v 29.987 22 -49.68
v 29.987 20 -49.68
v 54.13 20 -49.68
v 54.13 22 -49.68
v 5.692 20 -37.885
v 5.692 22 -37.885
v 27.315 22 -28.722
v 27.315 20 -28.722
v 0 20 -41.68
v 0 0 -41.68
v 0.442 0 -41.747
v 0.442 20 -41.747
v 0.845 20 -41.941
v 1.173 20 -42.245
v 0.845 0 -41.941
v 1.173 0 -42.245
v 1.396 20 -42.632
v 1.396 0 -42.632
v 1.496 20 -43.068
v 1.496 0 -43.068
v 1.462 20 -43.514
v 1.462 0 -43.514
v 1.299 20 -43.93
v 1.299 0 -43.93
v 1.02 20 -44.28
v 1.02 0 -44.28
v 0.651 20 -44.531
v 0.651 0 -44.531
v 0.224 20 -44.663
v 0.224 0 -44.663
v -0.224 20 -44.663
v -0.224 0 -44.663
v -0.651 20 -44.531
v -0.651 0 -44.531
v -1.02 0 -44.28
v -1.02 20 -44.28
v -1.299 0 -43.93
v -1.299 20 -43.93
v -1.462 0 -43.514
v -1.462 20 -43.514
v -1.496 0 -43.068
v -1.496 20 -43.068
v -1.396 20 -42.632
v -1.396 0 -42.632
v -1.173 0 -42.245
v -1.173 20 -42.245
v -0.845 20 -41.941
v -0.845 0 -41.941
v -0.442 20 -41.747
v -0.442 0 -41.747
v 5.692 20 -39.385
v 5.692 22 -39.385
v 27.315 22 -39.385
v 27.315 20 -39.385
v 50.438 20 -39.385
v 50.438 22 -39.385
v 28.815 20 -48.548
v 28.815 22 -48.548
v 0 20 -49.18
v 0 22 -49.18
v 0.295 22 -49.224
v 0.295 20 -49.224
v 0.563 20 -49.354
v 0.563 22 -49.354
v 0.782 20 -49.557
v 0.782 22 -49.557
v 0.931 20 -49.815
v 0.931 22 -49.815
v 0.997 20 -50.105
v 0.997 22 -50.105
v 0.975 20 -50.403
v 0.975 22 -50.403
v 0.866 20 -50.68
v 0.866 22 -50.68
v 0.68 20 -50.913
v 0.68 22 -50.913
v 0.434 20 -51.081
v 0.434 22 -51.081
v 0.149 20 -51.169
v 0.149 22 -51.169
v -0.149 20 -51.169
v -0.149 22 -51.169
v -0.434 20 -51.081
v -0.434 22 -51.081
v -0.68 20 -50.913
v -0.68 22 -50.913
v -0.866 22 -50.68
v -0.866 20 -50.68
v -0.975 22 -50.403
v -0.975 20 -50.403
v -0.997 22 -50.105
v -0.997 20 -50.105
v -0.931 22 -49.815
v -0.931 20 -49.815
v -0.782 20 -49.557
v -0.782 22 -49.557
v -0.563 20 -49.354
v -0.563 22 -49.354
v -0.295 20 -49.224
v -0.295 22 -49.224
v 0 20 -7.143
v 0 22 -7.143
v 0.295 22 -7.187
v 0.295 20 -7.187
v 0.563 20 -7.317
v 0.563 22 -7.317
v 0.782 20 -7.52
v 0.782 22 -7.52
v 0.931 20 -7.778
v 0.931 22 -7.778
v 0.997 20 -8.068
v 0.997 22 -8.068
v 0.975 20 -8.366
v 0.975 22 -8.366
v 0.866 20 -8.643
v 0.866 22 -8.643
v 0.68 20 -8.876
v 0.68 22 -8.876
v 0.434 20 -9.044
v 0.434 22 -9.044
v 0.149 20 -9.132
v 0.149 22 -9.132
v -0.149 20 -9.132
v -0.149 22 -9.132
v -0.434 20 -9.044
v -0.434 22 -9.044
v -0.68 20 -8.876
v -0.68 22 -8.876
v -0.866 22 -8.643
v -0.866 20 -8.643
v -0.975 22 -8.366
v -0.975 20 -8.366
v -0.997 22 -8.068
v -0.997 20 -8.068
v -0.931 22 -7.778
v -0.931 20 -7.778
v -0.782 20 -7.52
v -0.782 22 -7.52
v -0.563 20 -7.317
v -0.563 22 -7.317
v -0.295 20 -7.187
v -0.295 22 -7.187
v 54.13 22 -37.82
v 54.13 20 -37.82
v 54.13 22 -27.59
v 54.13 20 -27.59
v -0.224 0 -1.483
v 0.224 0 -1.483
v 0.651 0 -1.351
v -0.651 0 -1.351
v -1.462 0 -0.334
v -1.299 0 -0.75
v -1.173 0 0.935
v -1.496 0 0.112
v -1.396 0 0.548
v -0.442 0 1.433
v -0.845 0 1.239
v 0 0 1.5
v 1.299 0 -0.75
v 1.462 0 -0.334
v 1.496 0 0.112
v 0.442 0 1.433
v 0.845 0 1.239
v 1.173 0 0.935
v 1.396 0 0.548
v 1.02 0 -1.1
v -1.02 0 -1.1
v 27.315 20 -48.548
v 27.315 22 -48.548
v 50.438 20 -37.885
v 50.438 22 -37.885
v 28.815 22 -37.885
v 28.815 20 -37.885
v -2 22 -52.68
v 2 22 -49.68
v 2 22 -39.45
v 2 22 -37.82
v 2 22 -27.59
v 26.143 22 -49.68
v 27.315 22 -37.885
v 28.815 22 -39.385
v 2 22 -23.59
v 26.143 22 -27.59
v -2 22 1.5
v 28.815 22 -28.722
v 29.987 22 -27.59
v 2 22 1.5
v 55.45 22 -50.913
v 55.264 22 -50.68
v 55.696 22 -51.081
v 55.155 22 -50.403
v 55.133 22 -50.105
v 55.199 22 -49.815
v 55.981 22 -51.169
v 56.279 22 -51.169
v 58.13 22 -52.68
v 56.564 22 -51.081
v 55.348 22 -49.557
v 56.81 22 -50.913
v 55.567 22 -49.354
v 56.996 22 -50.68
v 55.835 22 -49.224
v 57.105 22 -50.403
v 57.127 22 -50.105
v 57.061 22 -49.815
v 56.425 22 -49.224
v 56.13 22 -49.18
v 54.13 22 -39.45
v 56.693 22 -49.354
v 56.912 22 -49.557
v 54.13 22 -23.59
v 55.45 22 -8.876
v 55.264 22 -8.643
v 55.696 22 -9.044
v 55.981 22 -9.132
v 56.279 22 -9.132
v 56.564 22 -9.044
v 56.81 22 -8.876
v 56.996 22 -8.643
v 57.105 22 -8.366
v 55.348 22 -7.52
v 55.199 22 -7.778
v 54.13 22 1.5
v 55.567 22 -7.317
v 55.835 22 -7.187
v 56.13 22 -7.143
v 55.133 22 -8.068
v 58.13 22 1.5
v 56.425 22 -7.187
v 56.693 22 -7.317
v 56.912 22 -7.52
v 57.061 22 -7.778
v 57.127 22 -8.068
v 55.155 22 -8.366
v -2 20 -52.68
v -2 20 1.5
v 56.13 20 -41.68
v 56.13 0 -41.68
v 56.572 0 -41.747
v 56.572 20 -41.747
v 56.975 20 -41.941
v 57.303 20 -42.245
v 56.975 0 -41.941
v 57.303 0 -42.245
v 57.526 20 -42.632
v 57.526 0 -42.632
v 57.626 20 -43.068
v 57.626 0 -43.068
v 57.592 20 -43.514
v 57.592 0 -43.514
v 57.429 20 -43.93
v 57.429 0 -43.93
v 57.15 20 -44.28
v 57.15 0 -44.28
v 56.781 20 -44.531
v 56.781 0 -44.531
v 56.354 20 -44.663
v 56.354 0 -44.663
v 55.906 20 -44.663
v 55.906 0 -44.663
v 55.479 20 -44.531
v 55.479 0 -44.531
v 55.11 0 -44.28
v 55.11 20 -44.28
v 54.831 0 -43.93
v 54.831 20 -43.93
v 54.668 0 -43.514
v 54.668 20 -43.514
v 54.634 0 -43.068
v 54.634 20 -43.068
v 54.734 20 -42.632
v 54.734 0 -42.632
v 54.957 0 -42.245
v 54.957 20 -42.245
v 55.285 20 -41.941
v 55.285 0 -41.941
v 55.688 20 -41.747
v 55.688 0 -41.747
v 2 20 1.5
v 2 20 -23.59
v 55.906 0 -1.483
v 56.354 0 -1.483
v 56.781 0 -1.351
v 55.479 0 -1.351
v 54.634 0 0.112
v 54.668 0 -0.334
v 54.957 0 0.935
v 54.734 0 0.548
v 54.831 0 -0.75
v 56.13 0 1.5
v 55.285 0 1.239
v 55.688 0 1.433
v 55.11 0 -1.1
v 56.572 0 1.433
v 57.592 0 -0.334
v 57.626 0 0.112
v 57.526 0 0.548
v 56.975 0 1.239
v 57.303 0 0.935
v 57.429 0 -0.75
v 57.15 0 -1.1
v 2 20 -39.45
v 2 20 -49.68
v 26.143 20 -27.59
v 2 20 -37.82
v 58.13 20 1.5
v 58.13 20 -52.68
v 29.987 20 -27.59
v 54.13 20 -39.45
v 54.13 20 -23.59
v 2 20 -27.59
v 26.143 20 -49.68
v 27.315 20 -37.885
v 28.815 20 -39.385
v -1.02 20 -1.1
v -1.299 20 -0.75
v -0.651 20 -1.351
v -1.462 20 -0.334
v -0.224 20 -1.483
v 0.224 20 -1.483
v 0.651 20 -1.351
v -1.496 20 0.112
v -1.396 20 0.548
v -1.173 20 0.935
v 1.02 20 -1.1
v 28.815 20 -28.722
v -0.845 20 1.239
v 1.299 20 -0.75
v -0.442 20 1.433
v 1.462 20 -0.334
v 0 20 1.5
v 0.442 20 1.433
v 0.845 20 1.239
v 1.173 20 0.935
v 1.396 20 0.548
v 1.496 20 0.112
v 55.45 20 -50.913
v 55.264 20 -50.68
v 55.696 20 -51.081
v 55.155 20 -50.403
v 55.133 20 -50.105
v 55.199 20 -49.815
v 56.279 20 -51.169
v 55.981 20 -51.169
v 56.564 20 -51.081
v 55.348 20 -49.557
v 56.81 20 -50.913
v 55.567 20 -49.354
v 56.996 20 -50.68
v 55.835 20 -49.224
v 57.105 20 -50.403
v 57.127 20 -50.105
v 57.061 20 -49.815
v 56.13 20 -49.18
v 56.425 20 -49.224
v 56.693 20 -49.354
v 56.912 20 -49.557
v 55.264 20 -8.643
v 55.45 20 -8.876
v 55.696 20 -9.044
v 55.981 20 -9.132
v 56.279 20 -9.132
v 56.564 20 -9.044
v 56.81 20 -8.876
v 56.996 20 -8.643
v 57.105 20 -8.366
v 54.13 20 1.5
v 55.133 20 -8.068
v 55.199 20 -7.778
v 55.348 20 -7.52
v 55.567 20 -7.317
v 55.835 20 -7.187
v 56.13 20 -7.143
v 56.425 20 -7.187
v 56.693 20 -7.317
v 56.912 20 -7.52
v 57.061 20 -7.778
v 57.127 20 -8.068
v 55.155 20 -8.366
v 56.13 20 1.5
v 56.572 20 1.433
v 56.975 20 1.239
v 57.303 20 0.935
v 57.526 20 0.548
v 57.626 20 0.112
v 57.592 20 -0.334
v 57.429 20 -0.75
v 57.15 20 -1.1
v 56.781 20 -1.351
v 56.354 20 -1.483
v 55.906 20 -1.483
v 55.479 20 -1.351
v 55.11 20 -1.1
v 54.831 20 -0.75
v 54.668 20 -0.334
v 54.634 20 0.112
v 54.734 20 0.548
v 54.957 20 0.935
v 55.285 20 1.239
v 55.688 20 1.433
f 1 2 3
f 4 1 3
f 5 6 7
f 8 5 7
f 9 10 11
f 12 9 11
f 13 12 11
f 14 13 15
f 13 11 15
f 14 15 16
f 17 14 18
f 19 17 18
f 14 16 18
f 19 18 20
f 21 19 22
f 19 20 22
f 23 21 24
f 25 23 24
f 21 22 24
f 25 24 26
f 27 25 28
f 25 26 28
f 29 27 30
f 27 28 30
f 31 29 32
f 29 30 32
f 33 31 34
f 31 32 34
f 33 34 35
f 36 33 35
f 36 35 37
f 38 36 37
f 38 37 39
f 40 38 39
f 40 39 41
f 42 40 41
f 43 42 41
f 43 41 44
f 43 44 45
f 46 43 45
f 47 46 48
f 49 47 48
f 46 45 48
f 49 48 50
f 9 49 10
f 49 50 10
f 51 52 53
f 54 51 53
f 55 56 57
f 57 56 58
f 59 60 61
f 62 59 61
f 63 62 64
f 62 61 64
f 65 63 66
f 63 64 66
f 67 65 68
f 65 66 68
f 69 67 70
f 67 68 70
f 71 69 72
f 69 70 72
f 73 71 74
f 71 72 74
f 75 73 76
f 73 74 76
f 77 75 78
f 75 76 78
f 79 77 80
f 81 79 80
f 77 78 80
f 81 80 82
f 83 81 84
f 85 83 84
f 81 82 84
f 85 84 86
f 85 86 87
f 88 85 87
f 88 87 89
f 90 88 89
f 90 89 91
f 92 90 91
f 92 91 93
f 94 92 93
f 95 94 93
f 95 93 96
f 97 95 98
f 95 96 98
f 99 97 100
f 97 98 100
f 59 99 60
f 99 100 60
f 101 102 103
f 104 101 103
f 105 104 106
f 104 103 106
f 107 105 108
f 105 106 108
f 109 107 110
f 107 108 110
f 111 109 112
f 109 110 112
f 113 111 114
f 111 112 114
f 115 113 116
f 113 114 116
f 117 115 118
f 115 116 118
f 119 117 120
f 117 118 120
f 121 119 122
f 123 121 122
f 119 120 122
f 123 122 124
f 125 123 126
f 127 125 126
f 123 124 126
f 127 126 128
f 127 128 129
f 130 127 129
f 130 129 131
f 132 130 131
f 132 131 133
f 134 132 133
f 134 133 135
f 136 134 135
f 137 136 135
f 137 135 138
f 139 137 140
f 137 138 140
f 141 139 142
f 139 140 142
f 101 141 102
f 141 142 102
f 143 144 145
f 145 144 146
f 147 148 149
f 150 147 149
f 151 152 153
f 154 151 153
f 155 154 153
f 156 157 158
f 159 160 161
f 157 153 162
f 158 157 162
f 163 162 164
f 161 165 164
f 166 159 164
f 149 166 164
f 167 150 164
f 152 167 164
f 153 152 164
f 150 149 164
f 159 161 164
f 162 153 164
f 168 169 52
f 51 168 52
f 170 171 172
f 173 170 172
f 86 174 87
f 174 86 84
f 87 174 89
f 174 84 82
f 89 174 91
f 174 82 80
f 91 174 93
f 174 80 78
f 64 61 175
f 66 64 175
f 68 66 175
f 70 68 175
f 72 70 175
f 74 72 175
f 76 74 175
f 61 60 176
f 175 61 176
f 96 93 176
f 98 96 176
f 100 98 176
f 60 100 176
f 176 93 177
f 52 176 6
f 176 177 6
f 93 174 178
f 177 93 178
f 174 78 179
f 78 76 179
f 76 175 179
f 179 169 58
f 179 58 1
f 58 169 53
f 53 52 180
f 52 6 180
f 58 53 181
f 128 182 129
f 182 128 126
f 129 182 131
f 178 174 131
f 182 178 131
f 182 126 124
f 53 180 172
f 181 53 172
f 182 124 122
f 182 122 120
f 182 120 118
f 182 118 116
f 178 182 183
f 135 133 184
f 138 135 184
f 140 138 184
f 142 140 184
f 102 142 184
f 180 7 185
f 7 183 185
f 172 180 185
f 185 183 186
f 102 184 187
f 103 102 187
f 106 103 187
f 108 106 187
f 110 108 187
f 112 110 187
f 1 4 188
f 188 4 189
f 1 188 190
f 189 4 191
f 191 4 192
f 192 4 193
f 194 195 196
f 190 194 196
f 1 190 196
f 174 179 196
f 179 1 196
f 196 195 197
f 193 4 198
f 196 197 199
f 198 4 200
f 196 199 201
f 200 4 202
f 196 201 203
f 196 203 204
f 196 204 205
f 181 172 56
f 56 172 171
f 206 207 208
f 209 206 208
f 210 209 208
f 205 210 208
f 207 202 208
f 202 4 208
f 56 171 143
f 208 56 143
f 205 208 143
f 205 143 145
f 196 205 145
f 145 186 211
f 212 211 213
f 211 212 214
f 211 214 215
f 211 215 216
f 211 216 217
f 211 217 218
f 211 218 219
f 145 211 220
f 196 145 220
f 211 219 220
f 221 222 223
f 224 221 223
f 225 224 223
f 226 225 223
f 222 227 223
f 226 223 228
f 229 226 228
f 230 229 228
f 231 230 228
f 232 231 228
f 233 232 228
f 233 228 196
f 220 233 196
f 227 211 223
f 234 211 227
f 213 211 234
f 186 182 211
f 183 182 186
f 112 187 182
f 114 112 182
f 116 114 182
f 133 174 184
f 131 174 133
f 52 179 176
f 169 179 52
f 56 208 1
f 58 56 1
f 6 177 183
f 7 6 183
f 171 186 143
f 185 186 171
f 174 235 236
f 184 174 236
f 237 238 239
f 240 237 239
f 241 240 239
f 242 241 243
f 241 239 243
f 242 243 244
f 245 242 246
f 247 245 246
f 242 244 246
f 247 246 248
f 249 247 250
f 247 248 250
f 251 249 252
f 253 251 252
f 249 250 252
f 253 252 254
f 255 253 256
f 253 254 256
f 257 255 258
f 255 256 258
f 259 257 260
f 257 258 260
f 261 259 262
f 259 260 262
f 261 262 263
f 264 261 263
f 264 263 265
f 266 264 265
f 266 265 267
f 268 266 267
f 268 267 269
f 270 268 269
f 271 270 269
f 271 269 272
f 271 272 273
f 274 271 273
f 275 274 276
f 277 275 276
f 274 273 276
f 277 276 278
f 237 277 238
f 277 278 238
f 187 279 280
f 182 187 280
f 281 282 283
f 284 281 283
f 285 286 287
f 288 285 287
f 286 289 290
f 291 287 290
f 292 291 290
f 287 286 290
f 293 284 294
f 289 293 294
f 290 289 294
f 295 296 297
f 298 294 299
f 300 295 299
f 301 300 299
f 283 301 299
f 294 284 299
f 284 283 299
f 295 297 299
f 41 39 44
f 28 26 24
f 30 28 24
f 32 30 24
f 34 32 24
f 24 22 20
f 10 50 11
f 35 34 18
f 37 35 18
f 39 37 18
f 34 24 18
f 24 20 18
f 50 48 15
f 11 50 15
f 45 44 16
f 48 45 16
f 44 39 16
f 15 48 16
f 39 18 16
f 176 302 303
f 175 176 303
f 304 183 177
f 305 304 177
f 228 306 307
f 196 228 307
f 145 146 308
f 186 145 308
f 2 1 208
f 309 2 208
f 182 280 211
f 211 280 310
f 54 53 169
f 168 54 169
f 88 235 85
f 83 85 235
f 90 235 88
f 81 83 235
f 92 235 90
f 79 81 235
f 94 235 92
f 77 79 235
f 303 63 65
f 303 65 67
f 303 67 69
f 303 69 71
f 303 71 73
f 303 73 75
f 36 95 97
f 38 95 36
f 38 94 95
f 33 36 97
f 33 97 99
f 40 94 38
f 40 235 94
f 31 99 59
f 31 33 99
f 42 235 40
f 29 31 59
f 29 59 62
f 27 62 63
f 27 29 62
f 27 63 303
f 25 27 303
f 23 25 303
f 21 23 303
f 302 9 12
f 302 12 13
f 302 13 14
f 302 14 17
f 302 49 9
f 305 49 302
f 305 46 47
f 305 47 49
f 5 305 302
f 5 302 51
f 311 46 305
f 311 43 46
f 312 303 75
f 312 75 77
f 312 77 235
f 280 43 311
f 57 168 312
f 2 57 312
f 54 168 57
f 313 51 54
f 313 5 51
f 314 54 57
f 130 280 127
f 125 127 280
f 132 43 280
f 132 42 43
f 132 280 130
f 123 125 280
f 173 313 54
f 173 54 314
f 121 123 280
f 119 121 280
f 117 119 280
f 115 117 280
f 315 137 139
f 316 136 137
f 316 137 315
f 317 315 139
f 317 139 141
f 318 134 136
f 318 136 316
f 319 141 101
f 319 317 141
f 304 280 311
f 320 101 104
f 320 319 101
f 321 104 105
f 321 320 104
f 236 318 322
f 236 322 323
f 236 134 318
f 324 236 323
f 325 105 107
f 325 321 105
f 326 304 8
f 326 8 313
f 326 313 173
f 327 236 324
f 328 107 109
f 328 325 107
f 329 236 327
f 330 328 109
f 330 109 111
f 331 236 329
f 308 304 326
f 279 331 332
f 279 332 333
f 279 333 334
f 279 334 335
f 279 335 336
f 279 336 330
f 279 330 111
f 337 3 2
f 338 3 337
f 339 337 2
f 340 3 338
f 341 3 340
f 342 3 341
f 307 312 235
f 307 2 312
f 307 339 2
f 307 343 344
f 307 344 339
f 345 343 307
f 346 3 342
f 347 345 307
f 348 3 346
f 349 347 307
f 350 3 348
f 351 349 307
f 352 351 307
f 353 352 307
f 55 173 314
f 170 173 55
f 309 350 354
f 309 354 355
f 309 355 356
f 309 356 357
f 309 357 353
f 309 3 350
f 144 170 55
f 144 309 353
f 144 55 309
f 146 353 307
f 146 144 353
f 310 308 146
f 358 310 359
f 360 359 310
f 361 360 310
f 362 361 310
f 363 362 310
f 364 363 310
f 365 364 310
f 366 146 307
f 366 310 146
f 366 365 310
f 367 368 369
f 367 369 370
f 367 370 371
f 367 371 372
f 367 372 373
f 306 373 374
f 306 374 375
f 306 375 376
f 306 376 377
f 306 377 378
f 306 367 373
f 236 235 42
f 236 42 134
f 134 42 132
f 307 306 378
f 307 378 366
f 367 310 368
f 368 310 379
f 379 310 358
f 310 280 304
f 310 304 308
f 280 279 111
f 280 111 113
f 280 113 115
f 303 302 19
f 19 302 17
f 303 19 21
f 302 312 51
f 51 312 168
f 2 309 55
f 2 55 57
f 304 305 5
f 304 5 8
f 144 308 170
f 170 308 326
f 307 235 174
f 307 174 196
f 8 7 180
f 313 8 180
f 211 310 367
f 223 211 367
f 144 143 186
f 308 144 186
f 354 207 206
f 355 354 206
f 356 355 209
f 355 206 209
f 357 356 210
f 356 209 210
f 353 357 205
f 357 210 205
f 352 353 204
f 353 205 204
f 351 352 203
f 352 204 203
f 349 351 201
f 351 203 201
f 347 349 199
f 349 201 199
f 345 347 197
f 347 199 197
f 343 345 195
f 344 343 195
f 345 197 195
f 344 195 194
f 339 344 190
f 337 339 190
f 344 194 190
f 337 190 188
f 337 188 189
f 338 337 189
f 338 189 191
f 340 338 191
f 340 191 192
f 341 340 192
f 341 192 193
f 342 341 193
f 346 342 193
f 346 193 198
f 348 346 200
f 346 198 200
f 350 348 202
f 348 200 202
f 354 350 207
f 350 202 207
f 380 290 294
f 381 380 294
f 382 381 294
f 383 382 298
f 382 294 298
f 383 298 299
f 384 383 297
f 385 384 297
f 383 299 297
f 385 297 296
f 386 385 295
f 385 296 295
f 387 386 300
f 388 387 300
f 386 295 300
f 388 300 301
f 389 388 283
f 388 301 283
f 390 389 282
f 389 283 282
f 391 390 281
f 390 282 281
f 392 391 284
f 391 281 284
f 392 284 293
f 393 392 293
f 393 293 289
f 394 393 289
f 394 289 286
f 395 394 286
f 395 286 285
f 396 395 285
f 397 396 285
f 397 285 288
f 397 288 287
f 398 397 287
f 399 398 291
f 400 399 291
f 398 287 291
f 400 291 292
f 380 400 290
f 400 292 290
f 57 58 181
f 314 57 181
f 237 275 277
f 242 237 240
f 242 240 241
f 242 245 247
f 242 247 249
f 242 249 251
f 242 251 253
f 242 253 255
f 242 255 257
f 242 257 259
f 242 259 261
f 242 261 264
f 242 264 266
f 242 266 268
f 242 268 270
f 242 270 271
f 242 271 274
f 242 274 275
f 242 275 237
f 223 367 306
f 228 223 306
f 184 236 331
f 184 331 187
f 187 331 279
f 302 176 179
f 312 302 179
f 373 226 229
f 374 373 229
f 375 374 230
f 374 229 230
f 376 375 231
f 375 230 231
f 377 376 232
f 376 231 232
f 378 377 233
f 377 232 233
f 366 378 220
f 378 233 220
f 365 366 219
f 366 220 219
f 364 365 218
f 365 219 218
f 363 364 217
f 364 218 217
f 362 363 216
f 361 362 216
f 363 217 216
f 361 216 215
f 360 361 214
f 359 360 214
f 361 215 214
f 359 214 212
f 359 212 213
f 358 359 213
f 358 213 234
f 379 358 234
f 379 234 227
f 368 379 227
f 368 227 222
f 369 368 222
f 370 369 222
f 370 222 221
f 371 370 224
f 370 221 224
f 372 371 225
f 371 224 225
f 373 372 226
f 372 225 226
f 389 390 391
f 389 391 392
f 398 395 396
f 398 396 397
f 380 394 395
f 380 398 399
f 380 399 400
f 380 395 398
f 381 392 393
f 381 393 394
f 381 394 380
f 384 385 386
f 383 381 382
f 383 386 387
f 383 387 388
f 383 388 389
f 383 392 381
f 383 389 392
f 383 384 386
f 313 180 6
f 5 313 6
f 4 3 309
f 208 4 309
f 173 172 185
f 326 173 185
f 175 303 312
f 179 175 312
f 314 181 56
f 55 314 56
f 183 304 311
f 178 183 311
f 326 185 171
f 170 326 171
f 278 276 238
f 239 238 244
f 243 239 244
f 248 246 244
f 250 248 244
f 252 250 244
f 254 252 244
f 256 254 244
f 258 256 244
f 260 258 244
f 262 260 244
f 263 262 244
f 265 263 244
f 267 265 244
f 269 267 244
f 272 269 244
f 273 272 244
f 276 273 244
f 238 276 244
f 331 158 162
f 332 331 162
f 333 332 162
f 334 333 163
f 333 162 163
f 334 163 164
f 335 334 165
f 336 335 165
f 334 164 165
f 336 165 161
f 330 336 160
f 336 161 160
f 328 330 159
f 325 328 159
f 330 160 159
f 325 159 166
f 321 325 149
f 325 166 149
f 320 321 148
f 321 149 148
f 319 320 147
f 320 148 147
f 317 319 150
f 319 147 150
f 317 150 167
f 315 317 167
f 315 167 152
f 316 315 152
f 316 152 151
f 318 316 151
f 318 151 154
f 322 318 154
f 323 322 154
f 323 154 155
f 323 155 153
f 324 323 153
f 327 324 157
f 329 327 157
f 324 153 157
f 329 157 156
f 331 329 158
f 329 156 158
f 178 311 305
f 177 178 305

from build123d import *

# Parameters (mm, degrees)
SKETCH_1_R          = 1.5
EXTRUDE_1_DEPTH     = 20
EXTRUDE_1_2_DEPTH   = 20
EXTRUDE_1_3_DEPTH   = 20
EXTRUDE_1_4_DEPTH   = 20
EXTRUDE_2_DEPTH     = 2
SKETCH_4_R          = 1
CUT_EXTRUDE_1_DEPTH = 2
SKETCH_5_W          = 52.13
SKETCH_5_H          = 3
EXTRUDE_3_DEPTH     = 2
EXTRUDE_START       = -2
EXTRUDE_3_2_DEPTH   = 2


# Read off the part's stored shape, not the designer's step: 拉伸-薄壁3
with BuildPart() as part:
    # 草图1 → 凸台-拉伸1 (new body)
    with BuildSketch(Plane(origin=(0, 0, 0), x_dir=(1, 0, 0), z_dir=(0, 1, 0))):
        with Locations(Location((0, 0, 0), (0, 0, 270))):
            Circle(SKETCH_1_R)
    extrude(amount=EXTRUDE_1_DEPTH)



with BuildPart() as body_2:
    # 草图1 → Extrude 1 2 (new body)
    with BuildSketch(Plane(origin=(0, 0, 0), x_dir=(1, 0, 0), z_dir=(0, 1, 0))):
        with Locations(Location((0, 43.18, 0), (0, 0, 270))):
            Circle(SKETCH_1_R)
    extrude(amount=EXTRUDE_1_2_DEPTH)


with BuildPart() as body_3:
    # 草图1 → Extrude 1 3 (new body)
    with BuildSketch(Plane(origin=(0, 0, 0), x_dir=(1, 0, 0), z_dir=(0, 1, 0))):
        with Locations(Location((56.13, 43.18, 0), (0, 0, 270))):
            Circle(SKETCH_1_R)
    extrude(amount=EXTRUDE_1_3_DEPTH)


with BuildPart() as body_4:
    # 草图1 → Extrude 1 4 (new body)
    with BuildSketch(Plane(origin=(0, 0, 0), x_dir=(1, 0, 0), z_dir=(0, 1, 0))):
        with Locations(Location((56.13, 0, 0), (0, 0, 270))):
            Circle(SKETCH_1_R)
    extrude(amount=EXTRUDE_1_4_DEPTH)


with BuildPart() as part_1:
    add(part.part)

    add(body_2.part)  # 凸台-拉伸2 merges body 2
    # 草图2 → 凸台-拉伸2 (add)
    with BuildSketch(Plane(origin=(0, 20, 0), x_dir=(1, 0, 0), z_dir=(0, 1, 0))):
        Polygon((-2, 52.68), (-2, -1.5), (2, -1.5), (2, 23.59), (54.13, 23.59), (54.13, -1.5), (58.13, -1.5), (58.13, 52.68), (54.13, 52.68), (54.13, 27.59), (2, 27.59), (2, 52.68), align=None)
    extrude(amount=EXTRUDE_2_DEPTH)

    # 草图4 → 切除-拉伸1 (cut)
    with BuildSketch(Plane(origin=(0, 22, 0), x_dir=(1, 0, 0), z_dir=(0, 1, 0))):
        with Locations(Location((0, 50.18, 0), (0, 0, 270))):
            Circle(SKETCH_4_R)
        with Locations(Location((0, 8.143, 0), (0, 0, 270))):
            Circle(SKETCH_4_R)
        with Locations(Location((56.13, 8.143, 0), (0, 0, 270))):
            Circle(SKETCH_4_R)
        with Locations(Location((56.13, 50.18, 0), (0, 0, 270))):
            Circle(SKETCH_4_R)
    extrude(amount=-CUT_EXTRUDE_1_DEPTH, mode=Mode.SUBTRACT)

    # 草图5 → Extrude 3 (add)
    with BuildSketch(Plane.XZ.offset(-20)):
        with Locations((28.065, -51.18)):
            Rectangle(SKETCH_5_W, SKETCH_5_H)
    extrude(amount=-EXTRUDE_3_DEPTH)

    # Extrude 3 2 outline → Extrude 3 2 (add)
    with BuildSketch(Plane.XZ.offset(-20).offset(EXTRUDE_START)):
        Polygon((26.142732706, -27.59), (2, -37.820442461), (2, -39.449557539), (26.142732706, -49.68), (29.987267294, -49.68), (54.13, -39.449557539), (54.13, -37.820442461), (29.987267294, -27.59), align=None)
        Polygon((27.315, -48.547631219), (5.692185809, -39.385), (27.315, -39.385), align=None, mode=Mode.SUBTRACT)
        Polygon((28.815, -39.385), (50.437814191, -39.385), (28.815, -48.547631219), align=None, mode=Mode.SUBTRACT)
        Polygon((27.315, -37.885), (5.692185809, -37.885), (27.315, -28.722368781), align=None, mode=Mode.SUBTRACT)
        Polygon((28.815, -37.885), (28.815, -28.722368781), (50.437814191, -37.885), align=None, mode=Mode.SUBTRACT)
    extrude(amount=EXTRUDE_3_2_DEPTH)


solid = Compound([body_3.part, body_4.part, part_1.part])
